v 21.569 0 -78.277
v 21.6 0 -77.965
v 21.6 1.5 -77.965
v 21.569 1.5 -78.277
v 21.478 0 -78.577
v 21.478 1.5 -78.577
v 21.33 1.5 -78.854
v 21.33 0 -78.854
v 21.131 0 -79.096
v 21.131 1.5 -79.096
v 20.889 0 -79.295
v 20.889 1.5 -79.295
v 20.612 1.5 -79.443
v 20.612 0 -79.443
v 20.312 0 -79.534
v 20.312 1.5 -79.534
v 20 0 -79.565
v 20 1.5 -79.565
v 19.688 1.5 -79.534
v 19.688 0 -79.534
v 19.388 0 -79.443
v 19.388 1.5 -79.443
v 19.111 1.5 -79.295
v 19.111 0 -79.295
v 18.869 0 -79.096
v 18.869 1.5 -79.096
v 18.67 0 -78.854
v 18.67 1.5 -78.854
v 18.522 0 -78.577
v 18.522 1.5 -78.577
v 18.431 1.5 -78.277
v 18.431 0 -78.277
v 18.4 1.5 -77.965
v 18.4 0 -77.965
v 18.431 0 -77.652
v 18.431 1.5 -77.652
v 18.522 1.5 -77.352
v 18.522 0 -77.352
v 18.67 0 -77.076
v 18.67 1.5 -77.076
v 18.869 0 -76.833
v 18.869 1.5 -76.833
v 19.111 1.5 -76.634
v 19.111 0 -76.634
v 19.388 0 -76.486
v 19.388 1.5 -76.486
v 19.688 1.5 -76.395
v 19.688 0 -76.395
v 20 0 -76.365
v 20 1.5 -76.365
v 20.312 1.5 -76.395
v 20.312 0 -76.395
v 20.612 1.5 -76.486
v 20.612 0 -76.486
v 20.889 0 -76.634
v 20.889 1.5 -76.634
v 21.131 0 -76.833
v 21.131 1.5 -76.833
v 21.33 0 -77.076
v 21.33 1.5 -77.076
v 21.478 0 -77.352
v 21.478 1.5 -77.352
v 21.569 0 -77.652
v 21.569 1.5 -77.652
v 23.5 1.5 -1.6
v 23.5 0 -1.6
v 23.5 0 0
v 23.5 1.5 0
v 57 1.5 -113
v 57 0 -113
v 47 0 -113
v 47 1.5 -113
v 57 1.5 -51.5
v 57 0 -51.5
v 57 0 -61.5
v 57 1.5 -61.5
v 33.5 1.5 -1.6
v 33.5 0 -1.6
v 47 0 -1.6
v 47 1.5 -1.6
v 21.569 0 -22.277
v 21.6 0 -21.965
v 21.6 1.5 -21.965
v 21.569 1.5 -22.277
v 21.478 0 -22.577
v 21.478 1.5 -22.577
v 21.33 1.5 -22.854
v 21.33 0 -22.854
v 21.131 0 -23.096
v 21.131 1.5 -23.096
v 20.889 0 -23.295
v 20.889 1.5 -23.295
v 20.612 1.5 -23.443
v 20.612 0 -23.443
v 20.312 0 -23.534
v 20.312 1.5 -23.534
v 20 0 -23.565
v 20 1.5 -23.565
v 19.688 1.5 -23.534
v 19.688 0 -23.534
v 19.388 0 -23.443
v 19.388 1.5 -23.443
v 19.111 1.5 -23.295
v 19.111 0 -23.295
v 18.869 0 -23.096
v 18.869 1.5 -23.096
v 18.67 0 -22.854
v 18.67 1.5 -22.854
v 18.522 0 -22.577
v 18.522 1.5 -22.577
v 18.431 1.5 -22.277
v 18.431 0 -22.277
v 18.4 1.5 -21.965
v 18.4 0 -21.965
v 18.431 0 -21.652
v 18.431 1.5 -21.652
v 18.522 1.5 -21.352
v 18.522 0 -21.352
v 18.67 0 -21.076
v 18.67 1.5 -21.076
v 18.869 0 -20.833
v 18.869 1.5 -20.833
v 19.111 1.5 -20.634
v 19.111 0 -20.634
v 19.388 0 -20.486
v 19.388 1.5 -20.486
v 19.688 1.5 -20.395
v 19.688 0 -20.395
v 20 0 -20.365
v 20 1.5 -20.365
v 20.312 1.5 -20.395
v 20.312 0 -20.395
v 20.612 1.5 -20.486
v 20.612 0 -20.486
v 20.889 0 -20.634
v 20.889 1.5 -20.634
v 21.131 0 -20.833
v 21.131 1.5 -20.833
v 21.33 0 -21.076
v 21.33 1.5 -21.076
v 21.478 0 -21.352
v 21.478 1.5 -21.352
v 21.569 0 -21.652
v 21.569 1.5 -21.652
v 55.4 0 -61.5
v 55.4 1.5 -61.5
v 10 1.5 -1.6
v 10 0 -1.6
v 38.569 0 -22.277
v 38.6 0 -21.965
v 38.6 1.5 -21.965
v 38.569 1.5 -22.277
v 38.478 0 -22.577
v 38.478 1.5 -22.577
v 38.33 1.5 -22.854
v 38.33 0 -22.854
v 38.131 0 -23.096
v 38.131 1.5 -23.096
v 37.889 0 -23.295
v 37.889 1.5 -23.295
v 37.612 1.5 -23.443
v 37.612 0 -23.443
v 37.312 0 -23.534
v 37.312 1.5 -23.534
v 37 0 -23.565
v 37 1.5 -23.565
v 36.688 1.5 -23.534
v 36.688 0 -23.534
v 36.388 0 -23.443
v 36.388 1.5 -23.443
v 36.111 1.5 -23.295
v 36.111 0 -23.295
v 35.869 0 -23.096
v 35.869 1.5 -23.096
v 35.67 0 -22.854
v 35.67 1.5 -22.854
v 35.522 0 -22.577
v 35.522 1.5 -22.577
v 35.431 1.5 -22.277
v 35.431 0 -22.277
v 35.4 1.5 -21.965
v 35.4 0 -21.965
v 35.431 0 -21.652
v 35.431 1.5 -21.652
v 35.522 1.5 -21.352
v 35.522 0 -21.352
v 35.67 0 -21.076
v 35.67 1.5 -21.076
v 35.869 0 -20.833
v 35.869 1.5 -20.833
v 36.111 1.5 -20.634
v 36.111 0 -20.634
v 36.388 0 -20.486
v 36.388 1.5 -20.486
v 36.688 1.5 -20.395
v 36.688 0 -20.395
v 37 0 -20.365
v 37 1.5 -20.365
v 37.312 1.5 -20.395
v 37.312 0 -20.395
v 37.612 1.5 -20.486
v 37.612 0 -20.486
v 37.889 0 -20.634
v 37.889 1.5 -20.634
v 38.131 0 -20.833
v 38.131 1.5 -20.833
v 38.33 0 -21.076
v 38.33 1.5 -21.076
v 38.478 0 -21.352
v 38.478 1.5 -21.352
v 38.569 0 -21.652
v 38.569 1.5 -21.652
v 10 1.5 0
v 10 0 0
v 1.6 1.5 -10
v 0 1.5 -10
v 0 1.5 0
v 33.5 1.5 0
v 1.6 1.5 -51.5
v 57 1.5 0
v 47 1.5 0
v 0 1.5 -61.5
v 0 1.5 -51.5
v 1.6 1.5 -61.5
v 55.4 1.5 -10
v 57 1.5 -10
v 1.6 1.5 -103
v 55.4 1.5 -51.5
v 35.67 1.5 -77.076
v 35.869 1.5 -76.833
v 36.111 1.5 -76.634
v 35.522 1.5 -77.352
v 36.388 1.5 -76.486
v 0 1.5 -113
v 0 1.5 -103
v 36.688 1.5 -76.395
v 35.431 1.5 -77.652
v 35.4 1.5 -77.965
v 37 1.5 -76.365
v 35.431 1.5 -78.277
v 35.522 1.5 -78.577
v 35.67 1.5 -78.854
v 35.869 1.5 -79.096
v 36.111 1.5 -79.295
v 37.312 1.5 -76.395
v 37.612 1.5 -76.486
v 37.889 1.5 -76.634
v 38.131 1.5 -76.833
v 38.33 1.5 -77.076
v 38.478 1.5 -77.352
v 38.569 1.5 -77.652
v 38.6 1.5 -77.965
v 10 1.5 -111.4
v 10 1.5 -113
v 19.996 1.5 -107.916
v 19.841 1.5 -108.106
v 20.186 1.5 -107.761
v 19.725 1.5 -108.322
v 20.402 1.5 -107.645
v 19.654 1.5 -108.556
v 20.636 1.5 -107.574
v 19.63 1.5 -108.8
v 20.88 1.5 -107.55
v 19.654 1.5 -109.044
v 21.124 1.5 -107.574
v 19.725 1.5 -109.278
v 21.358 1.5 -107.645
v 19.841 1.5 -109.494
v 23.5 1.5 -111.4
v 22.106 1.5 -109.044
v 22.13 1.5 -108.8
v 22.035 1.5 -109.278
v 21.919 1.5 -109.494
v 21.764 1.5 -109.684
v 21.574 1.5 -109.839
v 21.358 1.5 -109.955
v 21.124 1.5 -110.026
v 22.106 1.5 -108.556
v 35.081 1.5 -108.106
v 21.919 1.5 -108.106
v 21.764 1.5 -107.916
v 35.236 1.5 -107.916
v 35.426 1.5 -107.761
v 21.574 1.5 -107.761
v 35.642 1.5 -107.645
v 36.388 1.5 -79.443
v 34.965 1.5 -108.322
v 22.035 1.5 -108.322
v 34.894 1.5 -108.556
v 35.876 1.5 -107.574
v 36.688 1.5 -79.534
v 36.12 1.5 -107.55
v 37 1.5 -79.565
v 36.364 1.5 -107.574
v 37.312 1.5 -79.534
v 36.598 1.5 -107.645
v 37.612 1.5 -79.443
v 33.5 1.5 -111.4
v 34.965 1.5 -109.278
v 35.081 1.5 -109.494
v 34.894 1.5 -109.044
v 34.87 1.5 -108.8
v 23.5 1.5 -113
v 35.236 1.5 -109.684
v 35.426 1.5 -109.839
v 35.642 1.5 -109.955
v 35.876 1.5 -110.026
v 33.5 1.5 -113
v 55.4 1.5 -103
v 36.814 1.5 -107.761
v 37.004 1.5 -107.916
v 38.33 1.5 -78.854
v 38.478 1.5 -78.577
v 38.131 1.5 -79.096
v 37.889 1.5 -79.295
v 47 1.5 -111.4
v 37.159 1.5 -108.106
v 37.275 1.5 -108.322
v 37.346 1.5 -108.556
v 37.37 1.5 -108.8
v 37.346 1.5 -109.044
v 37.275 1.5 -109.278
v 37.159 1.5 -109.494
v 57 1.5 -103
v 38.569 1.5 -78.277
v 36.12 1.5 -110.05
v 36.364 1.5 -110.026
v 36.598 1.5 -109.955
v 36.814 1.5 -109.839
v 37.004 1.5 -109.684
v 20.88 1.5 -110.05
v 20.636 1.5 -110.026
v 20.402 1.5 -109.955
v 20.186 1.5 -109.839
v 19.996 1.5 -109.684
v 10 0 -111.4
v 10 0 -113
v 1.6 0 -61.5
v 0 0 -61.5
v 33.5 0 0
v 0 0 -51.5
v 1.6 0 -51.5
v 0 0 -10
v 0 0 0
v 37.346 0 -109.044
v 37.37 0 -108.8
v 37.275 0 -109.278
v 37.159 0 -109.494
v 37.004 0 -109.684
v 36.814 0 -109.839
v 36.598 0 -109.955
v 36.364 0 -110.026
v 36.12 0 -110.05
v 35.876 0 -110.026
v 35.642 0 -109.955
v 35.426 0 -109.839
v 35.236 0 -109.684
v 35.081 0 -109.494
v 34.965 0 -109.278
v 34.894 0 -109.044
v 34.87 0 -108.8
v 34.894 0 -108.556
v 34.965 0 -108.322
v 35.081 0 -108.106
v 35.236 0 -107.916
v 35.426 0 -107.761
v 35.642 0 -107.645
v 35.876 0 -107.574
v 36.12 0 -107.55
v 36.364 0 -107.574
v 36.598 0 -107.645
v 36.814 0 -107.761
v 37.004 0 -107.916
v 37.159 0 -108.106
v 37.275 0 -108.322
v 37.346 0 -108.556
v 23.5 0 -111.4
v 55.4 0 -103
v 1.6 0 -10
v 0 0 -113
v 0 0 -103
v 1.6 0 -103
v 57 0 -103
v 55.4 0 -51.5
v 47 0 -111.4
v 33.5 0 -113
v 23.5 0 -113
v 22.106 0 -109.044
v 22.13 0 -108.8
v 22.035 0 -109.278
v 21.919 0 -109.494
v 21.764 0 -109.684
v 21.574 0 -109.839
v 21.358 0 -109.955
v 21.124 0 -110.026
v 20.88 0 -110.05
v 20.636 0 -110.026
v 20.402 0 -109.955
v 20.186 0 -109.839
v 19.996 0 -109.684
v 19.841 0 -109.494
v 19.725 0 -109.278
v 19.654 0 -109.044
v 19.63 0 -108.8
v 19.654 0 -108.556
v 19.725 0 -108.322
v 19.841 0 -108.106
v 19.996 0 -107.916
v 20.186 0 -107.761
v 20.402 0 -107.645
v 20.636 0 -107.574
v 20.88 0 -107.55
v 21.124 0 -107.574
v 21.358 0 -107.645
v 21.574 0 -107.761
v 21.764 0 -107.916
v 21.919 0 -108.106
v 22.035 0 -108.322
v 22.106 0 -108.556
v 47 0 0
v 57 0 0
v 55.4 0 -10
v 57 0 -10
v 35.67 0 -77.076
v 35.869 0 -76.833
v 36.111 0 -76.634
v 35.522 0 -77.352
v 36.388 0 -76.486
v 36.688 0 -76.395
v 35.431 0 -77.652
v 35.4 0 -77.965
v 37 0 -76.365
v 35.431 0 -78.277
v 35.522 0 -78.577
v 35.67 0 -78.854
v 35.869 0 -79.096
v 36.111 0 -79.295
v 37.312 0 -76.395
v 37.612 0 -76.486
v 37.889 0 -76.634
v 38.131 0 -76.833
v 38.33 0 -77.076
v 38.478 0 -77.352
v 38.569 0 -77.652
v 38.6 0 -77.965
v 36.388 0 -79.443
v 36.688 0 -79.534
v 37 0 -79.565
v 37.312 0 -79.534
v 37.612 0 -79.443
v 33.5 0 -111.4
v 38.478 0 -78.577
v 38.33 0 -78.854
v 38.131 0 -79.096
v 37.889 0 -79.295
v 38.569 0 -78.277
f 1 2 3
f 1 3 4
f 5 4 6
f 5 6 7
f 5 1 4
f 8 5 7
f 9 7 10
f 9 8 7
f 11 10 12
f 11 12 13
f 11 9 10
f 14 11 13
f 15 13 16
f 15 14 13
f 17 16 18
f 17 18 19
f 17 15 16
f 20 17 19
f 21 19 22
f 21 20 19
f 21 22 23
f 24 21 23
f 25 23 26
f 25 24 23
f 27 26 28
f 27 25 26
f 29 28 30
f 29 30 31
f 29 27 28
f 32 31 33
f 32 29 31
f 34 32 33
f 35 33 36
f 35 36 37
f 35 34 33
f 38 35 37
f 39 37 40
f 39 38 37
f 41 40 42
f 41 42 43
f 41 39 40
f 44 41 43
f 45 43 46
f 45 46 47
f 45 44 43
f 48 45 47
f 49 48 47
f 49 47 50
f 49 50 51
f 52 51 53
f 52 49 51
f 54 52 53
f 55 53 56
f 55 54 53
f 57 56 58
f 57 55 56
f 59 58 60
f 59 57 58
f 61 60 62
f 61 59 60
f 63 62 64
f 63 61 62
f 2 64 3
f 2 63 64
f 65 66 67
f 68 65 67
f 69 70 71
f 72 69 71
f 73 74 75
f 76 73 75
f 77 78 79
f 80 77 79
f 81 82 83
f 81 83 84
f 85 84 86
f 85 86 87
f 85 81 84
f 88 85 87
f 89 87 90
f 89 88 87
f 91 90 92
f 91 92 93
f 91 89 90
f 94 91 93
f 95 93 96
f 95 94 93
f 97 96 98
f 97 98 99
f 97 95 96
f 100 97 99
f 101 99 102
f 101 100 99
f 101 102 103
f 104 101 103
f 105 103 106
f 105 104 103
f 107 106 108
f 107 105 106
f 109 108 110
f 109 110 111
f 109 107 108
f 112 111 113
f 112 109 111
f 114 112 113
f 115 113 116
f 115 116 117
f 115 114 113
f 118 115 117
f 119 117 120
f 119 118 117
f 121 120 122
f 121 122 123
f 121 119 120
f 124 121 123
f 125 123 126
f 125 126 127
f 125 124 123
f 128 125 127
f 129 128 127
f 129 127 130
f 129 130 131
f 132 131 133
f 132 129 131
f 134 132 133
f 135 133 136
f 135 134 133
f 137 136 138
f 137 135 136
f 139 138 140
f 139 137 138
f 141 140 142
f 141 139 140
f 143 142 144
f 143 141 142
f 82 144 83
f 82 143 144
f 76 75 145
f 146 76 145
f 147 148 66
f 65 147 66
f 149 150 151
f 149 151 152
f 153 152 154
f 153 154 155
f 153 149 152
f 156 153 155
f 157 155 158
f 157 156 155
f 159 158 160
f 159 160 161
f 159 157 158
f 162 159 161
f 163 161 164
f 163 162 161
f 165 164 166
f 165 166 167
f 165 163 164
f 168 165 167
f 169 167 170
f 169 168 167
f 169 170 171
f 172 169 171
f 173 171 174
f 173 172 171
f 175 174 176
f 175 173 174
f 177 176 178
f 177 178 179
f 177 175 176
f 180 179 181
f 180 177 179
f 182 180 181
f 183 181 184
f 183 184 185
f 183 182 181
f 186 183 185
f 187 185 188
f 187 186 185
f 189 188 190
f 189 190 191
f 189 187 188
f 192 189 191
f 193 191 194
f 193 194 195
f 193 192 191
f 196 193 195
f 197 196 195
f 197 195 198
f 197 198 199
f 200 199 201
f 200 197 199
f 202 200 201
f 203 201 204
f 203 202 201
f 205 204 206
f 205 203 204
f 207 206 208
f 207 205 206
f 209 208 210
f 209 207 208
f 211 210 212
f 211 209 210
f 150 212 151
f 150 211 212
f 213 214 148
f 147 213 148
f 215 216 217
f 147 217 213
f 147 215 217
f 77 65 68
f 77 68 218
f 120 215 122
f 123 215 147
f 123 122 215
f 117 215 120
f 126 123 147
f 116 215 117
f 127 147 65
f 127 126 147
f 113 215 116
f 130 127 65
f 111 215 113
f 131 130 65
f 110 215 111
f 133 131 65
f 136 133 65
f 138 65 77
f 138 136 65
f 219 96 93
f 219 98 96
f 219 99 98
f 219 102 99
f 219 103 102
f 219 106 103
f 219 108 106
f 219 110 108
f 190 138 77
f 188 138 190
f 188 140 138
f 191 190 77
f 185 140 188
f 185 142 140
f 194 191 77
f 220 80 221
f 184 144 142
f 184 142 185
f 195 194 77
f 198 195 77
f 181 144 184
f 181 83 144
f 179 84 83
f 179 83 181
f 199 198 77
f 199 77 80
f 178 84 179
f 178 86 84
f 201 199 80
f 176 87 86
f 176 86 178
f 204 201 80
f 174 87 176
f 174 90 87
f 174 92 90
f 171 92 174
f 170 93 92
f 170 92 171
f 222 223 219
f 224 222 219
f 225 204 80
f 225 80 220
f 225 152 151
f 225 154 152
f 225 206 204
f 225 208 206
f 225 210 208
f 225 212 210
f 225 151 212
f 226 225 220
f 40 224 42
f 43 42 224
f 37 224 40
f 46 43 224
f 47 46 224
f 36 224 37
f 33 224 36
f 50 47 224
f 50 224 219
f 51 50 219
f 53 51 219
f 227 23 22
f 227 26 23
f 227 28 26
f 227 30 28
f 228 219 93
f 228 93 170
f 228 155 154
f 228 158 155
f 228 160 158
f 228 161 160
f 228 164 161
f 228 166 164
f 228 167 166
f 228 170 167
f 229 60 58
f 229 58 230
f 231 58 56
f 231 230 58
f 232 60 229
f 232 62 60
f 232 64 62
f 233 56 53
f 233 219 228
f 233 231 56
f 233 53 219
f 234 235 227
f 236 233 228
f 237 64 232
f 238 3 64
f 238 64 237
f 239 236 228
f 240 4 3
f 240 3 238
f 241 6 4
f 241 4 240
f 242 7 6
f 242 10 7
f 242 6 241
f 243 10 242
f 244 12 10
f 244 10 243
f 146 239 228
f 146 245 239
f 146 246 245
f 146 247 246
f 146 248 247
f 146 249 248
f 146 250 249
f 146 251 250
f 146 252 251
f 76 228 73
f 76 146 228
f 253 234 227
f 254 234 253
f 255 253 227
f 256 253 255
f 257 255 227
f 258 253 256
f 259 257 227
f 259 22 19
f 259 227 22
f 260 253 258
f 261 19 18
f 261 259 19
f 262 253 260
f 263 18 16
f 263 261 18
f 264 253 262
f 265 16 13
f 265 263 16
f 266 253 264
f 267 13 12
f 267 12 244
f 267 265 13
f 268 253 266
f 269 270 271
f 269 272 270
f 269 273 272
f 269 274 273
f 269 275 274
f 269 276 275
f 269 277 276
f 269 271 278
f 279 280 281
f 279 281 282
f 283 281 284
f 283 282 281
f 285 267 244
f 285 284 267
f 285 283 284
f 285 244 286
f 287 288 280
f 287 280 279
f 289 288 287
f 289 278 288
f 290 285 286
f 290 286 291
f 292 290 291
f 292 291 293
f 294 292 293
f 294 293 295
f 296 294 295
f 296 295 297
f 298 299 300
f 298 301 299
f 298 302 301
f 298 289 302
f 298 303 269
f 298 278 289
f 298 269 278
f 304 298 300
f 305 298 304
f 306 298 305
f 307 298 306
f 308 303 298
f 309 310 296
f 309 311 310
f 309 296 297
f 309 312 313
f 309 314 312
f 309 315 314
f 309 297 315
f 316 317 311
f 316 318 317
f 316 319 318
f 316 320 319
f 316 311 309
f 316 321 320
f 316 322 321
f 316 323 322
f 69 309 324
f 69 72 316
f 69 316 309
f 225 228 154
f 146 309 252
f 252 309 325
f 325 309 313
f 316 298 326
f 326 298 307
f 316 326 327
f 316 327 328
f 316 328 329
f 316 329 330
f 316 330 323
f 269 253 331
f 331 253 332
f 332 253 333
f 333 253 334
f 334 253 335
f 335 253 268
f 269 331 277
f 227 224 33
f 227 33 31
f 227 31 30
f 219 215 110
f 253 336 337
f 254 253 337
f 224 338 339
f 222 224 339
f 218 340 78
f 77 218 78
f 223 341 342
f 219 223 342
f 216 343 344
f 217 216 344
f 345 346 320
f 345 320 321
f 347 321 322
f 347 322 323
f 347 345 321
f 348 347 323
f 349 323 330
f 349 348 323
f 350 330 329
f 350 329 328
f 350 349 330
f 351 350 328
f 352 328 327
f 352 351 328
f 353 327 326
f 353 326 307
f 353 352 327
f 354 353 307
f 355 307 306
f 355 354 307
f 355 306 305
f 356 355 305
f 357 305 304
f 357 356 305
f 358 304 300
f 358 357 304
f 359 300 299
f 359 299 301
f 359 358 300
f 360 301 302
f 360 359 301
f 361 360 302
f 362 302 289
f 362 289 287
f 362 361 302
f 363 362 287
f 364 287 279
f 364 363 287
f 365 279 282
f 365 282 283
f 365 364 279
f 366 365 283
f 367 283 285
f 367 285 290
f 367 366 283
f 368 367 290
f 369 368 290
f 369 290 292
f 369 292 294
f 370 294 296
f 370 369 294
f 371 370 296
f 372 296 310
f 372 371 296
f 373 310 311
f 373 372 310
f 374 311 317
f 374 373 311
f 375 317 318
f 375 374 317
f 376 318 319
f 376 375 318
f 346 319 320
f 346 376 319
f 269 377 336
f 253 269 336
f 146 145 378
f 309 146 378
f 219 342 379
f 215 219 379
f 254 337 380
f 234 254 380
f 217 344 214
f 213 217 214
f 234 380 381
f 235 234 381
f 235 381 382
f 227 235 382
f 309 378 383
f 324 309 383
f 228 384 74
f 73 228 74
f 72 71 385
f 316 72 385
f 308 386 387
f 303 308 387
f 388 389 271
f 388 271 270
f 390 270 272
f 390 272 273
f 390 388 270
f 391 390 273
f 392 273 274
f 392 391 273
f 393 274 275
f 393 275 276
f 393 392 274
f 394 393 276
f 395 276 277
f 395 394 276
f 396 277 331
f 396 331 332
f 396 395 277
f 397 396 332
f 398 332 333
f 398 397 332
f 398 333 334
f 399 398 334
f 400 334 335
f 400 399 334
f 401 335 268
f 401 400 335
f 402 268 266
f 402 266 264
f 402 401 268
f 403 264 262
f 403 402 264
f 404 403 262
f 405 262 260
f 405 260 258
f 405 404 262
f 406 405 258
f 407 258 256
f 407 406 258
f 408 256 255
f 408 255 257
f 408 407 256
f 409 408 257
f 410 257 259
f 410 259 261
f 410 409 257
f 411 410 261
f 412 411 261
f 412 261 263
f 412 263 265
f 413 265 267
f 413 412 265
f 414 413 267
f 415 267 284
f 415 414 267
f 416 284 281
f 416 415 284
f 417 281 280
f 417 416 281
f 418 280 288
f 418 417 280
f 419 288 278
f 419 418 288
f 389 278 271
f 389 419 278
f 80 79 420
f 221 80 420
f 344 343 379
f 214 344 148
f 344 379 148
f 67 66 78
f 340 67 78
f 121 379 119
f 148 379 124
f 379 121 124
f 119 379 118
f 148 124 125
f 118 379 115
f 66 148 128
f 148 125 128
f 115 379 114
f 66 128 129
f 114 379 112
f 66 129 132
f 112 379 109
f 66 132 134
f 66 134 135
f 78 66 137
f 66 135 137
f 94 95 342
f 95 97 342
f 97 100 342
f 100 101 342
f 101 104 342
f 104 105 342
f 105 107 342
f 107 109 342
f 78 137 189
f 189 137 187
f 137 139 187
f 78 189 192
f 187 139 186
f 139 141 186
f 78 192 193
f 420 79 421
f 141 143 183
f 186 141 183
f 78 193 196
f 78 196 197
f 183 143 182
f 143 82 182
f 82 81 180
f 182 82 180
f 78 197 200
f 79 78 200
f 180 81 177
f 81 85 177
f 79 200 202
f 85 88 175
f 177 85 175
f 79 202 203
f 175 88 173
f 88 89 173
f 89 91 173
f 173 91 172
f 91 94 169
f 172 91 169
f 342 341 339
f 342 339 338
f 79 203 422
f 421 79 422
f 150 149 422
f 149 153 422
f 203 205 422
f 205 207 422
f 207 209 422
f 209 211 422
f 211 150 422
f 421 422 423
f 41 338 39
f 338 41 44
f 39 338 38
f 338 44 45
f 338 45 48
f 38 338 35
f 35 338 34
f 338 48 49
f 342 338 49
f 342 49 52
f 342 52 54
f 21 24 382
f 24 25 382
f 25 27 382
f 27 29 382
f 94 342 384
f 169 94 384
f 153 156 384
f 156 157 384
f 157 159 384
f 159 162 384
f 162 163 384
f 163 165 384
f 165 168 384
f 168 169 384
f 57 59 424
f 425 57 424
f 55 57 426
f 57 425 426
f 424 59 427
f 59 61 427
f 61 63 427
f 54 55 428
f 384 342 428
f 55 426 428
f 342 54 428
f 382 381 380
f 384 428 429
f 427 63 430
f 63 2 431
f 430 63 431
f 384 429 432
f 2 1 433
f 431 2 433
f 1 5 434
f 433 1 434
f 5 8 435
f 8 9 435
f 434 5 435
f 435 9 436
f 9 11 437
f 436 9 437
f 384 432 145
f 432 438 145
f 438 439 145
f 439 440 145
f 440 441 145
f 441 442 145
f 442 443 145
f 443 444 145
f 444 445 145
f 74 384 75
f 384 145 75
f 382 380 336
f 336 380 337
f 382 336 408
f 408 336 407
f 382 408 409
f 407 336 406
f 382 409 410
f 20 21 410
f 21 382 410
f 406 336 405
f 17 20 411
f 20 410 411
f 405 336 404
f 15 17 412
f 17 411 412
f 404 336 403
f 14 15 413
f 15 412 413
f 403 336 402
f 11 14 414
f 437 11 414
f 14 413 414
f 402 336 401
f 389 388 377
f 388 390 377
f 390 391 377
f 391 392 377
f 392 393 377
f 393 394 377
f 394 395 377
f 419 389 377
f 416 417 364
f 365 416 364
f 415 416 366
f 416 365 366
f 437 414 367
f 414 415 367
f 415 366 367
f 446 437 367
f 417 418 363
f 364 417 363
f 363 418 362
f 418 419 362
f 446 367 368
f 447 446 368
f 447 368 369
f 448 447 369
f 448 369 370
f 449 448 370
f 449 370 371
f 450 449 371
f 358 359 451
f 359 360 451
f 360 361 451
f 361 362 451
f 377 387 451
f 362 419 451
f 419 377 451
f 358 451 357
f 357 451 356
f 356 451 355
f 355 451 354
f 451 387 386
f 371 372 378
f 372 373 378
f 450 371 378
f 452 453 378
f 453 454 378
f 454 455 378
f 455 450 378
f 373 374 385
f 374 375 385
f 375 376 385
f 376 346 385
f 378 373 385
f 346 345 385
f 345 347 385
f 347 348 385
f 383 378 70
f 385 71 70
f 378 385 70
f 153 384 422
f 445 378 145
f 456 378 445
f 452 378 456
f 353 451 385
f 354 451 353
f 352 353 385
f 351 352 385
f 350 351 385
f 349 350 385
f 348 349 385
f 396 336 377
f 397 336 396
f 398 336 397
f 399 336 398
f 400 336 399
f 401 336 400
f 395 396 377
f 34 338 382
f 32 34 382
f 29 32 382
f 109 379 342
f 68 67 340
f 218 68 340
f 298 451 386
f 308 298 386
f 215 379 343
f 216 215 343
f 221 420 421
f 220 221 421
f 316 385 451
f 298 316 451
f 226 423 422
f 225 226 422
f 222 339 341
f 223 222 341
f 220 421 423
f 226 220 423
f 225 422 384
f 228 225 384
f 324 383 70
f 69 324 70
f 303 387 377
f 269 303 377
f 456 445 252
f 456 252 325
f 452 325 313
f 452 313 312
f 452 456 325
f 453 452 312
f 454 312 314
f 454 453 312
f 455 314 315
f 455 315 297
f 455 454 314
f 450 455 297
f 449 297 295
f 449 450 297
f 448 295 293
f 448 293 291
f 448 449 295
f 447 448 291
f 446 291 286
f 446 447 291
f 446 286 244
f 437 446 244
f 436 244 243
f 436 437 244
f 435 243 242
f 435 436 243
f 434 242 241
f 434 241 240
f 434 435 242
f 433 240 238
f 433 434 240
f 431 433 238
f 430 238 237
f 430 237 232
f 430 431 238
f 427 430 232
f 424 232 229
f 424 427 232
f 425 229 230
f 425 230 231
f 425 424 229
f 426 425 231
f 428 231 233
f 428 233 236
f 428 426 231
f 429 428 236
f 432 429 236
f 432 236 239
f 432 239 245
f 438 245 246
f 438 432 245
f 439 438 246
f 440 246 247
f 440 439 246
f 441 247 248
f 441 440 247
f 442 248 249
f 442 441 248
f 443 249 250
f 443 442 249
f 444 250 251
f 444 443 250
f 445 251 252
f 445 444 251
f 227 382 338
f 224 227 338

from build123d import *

# Parameters (mm, degrees)
SKETCH1_R           = 1.25
SKETCH1_R_2         = 1.6
BOSS_EXTRUDE1_DEPTH = 1.5


with BuildPart() as part:
    # Sketch1 → Boss-Extrude1 (new body)
    with BuildSketch(Plane(origin=(0, 0, 0), x_dir=(1, 0, 0), z_dir=(0, 1, 0))):
        Polygon((57, 0), (57, 10), (55.4, 10), (55.4, 51.5), (57, 51.5), (57, 61.5), (55.4, 61.5), (55.4, 103), (57, 103), (57, 113), (47, 113), (47, 111.4), (33.5, 111.4), (33.5, 113), (23.5, 113), (23.5, 111.4), (10, 111.4), (10, 113), (0, 113), (0, 103), (1.6, 103), (1.6, 61.5), (0, 61.5), (0, 51.5), (1.6, 51.5), (1.6, 10), (0, 10), (0, 0), (10, 0), (10, 1.6), (23.5, 1.6), (23.5, 0), (33.5, 0), (33.5, 1.6), (47, 1.6), (47, 0), align=None)
        with Locations((20.88, 108.8)):
            Circle(SKETCH1_R, mode=Mode.SUBTRACT)
        with Locations((36.12, 108.8)):
            Circle(SKETCH1_R, mode=Mode.SUBTRACT)
        with Locations((20, 77.964629758)):
            Circle(SKETCH1_R_2, mode=Mode.SUBTRACT)
        with Locations((37, 77.964629758)):
            Circle(SKETCH1_R_2, mode=Mode.SUBTRACT)
        with Locations((20, 21.964629758)):
            Circle(SKETCH1_R_2, mode=Mode.SUBTRACT)
        with Locations((37, 21.964629758)):
            Circle(SKETCH1_R_2, mode=Mode.SUBTRACT)
    extrude(amount=BOSS_EXTRUDE1_DEPTH)


solid = part.part
